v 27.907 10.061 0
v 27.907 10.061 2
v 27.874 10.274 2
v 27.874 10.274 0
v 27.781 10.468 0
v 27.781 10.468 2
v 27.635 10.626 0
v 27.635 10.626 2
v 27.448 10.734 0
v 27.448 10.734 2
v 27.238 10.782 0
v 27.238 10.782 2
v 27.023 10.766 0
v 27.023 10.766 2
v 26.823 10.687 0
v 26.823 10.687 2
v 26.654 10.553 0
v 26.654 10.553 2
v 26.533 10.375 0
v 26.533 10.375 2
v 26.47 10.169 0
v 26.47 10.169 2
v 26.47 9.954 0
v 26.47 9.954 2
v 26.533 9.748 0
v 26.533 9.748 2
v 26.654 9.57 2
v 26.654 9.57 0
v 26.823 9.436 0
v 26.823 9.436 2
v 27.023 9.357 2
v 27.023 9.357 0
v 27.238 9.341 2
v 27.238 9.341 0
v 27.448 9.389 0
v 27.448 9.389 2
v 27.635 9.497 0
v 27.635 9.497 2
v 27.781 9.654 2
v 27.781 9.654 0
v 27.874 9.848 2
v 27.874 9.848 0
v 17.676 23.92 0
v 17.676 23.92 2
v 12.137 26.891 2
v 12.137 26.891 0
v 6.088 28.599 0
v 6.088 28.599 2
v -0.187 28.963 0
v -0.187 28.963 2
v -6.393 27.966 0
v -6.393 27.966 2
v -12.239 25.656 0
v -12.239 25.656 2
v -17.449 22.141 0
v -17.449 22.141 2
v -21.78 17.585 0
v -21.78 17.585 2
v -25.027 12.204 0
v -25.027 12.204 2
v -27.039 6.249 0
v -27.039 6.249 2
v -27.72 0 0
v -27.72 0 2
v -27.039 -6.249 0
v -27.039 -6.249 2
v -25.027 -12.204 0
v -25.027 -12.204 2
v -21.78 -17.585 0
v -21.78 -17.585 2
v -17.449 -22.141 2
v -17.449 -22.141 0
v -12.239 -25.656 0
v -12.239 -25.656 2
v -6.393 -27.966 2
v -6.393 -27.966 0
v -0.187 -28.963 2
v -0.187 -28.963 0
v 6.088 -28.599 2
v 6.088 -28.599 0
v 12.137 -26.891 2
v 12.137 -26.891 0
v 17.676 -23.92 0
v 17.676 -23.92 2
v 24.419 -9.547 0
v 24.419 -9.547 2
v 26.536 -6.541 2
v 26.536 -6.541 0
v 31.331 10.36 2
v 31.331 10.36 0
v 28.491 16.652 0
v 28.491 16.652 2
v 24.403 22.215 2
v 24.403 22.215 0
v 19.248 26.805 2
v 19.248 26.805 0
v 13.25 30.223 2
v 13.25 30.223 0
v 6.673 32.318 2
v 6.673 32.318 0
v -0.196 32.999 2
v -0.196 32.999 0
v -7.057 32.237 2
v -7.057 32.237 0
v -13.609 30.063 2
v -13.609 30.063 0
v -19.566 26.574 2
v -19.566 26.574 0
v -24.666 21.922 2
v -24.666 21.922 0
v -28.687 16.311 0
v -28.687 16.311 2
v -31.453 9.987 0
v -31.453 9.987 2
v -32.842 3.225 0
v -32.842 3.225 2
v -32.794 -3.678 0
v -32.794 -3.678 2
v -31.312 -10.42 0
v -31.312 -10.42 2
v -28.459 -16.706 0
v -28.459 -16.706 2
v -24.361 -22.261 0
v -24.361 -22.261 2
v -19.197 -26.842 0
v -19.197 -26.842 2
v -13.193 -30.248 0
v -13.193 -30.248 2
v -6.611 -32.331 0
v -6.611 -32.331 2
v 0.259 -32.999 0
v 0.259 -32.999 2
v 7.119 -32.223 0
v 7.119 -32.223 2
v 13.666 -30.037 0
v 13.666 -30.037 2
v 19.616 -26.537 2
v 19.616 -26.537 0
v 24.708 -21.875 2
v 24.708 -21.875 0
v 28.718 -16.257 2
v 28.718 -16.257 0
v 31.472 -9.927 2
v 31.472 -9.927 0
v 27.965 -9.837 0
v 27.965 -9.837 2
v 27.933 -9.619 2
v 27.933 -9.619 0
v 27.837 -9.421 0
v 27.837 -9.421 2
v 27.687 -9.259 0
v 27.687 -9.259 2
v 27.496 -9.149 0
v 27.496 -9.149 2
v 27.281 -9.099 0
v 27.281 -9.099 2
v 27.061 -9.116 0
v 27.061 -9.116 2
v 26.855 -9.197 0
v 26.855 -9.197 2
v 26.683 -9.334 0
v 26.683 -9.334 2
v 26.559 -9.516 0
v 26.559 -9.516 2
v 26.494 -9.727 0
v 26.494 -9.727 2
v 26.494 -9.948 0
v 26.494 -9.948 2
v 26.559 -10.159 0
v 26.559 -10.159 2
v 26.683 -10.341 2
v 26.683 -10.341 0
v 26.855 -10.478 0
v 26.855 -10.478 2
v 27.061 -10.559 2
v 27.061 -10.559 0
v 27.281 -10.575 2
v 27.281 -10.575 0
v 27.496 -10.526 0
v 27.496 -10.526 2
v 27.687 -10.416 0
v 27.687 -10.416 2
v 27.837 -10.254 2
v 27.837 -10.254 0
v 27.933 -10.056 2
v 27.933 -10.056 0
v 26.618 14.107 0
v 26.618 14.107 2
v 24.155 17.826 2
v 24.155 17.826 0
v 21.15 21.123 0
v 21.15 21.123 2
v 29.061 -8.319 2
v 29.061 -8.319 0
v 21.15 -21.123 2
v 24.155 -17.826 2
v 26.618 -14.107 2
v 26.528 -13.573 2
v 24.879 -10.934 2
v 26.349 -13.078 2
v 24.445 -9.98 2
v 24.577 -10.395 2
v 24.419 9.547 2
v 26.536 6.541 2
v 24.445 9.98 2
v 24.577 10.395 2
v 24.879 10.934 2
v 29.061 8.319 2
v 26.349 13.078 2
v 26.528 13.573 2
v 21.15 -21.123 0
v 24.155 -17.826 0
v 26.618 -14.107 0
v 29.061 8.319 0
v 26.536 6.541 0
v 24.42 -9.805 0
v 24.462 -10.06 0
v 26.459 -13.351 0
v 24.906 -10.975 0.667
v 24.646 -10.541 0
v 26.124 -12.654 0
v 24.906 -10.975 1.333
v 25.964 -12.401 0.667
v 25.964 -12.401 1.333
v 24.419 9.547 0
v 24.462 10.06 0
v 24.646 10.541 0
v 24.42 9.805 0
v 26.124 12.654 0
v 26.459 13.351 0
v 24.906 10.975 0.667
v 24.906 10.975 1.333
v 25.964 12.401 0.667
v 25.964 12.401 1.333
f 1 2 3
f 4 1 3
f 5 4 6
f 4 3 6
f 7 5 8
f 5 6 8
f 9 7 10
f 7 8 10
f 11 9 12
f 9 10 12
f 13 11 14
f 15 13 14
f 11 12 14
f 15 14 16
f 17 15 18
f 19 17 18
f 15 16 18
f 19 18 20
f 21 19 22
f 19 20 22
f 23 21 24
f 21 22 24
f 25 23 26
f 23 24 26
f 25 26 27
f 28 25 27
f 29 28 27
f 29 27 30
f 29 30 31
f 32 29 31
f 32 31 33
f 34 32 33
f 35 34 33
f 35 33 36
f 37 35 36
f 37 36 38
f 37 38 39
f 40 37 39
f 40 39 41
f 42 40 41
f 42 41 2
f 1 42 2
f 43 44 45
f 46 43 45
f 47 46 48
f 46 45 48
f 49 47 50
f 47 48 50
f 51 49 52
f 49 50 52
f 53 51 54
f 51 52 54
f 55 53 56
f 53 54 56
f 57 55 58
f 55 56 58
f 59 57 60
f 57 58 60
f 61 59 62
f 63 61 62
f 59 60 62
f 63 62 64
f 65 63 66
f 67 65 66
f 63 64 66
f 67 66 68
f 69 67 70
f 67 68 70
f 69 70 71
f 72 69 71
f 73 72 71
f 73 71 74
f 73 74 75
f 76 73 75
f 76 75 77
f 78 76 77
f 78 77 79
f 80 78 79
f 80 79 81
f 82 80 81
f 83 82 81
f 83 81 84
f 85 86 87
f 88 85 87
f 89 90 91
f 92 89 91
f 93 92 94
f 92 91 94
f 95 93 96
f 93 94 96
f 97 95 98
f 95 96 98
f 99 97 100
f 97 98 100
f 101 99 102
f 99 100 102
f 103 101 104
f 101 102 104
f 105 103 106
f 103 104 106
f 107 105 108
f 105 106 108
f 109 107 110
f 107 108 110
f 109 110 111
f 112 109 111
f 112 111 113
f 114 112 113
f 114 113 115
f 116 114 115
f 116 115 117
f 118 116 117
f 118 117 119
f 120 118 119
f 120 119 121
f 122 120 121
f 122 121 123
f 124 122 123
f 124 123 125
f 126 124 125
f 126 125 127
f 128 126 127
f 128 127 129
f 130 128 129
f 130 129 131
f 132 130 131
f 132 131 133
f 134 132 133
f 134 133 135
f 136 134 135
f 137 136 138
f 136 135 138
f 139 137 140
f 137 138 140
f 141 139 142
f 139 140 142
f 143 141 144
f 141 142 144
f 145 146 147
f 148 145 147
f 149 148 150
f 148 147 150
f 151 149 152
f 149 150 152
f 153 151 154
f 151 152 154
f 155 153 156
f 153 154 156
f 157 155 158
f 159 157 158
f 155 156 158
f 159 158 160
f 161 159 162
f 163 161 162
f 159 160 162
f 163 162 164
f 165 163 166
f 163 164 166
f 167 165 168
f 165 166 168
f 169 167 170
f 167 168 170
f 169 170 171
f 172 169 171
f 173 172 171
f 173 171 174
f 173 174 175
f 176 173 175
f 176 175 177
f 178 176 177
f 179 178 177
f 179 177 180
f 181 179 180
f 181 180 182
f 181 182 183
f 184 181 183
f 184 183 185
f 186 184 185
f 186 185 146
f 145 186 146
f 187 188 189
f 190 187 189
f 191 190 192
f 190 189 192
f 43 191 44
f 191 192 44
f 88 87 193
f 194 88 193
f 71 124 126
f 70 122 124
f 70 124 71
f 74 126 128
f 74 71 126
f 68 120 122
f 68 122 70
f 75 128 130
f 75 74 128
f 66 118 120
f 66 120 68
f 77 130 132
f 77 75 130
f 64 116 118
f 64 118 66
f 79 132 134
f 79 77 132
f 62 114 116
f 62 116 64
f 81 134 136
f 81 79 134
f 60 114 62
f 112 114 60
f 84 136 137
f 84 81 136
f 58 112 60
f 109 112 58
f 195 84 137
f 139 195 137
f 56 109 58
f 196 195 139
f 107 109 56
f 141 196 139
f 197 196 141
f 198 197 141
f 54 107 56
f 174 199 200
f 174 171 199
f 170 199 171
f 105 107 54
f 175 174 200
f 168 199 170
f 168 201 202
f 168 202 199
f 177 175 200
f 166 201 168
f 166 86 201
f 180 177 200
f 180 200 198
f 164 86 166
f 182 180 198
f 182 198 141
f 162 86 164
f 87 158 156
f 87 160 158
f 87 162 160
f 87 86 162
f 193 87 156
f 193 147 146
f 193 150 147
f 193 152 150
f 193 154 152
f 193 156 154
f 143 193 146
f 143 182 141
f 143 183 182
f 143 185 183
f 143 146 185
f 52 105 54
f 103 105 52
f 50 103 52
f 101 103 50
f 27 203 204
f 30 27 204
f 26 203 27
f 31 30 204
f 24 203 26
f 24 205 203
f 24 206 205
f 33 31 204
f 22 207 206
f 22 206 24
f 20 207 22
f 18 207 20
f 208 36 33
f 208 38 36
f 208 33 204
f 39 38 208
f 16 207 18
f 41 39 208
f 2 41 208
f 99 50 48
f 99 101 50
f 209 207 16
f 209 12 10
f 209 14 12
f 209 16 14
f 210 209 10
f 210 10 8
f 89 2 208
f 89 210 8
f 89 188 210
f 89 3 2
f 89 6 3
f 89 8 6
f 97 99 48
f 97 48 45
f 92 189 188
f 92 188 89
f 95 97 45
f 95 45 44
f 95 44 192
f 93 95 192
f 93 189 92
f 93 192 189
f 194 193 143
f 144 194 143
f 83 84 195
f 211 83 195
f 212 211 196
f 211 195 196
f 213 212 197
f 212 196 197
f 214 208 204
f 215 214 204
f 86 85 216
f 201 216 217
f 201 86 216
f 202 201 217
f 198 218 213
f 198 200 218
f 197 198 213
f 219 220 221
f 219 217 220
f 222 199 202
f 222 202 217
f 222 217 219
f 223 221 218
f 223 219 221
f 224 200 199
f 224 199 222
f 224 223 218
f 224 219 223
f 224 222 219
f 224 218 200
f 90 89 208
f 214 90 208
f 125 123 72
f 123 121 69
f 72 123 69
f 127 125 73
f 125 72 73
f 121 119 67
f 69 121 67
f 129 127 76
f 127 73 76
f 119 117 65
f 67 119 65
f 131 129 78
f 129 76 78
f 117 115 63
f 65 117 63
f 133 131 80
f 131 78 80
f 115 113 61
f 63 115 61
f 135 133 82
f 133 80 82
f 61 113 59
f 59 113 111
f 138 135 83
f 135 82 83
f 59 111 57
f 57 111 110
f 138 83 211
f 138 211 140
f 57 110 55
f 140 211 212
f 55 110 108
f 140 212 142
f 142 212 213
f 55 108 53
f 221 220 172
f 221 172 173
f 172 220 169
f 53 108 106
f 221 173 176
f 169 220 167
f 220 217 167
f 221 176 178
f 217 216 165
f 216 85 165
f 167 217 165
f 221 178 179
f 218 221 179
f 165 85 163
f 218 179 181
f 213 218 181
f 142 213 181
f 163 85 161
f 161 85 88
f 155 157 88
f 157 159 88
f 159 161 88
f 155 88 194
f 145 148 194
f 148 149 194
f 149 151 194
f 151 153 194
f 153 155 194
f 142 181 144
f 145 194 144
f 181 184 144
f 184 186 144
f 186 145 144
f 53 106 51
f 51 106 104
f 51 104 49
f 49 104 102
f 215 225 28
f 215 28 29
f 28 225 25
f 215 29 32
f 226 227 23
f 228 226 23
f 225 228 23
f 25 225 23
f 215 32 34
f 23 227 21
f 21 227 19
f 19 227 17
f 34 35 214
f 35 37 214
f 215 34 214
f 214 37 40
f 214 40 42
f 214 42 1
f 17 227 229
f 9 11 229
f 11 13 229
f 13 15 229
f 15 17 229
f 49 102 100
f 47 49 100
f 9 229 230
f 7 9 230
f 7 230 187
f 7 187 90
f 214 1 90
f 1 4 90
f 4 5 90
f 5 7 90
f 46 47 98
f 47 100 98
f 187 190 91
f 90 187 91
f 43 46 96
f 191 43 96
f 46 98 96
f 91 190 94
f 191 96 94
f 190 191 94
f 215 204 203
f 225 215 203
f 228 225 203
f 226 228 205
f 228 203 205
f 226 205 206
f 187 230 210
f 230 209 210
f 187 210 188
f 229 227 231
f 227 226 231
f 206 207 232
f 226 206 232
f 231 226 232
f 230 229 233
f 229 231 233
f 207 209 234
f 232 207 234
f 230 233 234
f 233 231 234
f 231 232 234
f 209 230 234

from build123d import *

# Parameters (mm, degrees)
F0_R     = 33
F1_DEPTH = 2
F3_DEPTH = 2.001
F5_DEPTH = 2.0010001
F6_R     = 0.7224908552
F6_R_2   = 0.7400457382
F7_DEPTH = 2.0010001


with BuildPart() as f1:
    # F0 (on Top) → F1 (new body)
    with BuildSketch(Plane.XY):
        Circle(F0_R)
    extrude(amount=F1_DEPTH)

    # F2 (on face) → F3 (cut, through all)
    with BuildSketch(Plane.XY.offset(2)):
        with BuildLine():
            ThreePointArc((26.6176071003, 14.1071927868), (22.716020238, 19.5321055237), (17.6763167755, 23.9199805513))
            ThreePointArc((17.6763167755, 23.9199805513), (-27.7198574863, 0), (17.6763167755, -23.9199805513))
            ThreePointArc((17.6763167755, -23.9199805513), (22.716020238, -19.5321055237), (26.6176071003, -14.1071927868))
            add(Edge.make_bspline(
                [(24.4190643431, -9.5471604607), (24.2953095849, -11.0698888291), (26.490861777, -12.1669797839), (26.6176071003, -14.1071927868)],
                knots=[0, 0, 0, 0, 0.3817701134, 0.3817701134, 0.3817701134, 0.3817701134], degree=3))
            Line((24.4190643431, -9.5471604607), (26.5364420049, -6.540675446))
            Line((26.5364420049, -6.540675446), (29.0613579283, -8.3188983701))
            ThreePointArc((29.0613579283, -8.3188983701), (29.97382864, -4.203852577), (30.2801425137, 0))
            ThreePointArc((30.2801425137, 0), (29.97382864, 4.203852577), (29.0613579283, 8.3188983701))
            Line((29.0613579283, 8.3188983701), (26.5364420049, 6.540675446))
            Line((26.5364420049, 6.540675446), (24.4190643431, 9.5471604607))
            add(Edge.make_bspline(
                [(24.4190643431, 9.5471604607), (24.2953095849, 11.0698888291), (26.490861777, 12.1669797839), (26.6176071003, 14.1071927868)],
                knots=[0, 0, 0, 0, 0.3817701134, 0.3817701134, 0.3817701134, 0.3817701134], degree=3))
        make_face()
    extrude(amount=-F3_DEPTH, mode=Mode.SUBTRACT)

    # F4 (on face) → F5 (cut, through all)
    with BuildSketch(Plane.XY.offset(2)):
        Polygon((31.331487748, 10.3603993888), (29.0613579283, 8.3188983701), (29.0613579283, -8.3188983701), (31.4715985336, -9.9266553149), (41.9540777802, 0), align=None)
    extrude(amount=-F5_DEPTH, mode=Mode.SUBTRACT)

    # F6 (on face) → F7 (cut, through all)
    with BuildSketch(Plane.XY.offset(2)):
        with Locations((27.1840710193, 10.0614046678)):
            Circle(F6_R)
        with Locations((27.2254403681, -9.8374607041)):
            Circle(F6_R_2)
    extrude(amount=-F7_DEPTH, mode=Mode.SUBTRACT)


solid = f1.part
